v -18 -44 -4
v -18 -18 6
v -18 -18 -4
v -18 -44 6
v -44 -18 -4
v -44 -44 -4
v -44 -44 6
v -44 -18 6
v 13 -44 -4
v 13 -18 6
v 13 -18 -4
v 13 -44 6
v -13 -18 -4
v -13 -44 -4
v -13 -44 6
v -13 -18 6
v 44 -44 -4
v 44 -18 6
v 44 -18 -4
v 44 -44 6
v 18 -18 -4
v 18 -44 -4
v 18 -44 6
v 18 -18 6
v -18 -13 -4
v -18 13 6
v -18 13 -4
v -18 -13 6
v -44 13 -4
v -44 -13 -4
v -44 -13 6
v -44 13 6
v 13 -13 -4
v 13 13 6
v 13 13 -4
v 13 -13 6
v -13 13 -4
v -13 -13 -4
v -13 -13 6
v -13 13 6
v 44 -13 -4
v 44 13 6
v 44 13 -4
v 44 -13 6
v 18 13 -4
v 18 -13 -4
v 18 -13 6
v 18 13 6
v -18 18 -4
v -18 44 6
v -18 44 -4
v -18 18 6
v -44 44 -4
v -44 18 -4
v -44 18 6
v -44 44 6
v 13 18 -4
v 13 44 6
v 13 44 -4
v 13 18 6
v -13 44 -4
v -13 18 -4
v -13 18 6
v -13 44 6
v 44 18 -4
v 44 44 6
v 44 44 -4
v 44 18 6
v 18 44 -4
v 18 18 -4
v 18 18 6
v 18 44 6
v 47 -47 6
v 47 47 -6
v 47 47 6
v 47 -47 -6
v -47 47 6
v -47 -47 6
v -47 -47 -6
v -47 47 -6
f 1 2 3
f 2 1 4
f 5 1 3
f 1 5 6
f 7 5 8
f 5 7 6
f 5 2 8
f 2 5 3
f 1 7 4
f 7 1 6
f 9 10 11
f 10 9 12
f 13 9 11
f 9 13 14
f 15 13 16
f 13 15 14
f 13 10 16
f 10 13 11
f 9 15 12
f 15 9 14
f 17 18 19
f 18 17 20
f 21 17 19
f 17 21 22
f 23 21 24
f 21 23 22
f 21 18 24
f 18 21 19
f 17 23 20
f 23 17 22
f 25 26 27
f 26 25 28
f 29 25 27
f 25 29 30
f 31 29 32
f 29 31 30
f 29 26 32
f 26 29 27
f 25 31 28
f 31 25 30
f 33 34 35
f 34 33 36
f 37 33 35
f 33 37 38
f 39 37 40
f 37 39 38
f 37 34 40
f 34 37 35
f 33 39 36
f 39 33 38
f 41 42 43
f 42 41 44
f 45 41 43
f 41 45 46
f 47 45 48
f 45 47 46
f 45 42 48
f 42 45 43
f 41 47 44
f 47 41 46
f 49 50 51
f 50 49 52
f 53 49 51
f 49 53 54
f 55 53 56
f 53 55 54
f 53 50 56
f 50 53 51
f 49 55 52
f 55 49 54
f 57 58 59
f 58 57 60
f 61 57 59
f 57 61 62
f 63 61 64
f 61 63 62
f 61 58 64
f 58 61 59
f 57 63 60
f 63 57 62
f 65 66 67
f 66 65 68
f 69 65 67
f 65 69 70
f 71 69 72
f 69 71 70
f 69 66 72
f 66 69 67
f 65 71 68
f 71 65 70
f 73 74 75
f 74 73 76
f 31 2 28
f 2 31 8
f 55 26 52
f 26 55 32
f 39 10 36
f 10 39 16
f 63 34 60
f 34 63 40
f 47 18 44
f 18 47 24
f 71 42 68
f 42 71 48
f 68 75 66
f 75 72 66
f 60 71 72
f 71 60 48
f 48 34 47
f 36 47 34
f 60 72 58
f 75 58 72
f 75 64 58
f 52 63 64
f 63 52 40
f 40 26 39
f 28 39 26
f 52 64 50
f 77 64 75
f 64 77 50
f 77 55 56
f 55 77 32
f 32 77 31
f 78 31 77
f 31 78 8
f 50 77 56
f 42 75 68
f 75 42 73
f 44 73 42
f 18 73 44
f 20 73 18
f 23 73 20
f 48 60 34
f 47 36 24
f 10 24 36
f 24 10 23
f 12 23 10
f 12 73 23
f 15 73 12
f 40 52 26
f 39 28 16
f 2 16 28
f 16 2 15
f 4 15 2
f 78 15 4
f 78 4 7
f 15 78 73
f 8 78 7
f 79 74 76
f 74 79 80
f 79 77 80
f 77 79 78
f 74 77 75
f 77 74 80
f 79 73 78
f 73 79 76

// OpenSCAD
$fn = 32;

// ----------------------------------------------------------------------
// Pocket plate 94 x 94 x 12
// 3 x 3 pockets 26 mm square, 10 mm deep
// ----------------------------------------------------------------------

// --- parameters (mm) ---
thickness = 12;  // plate thickness
floor_t = 2;     // material left under each pocket
pocket = 26;     // pocket side length
pitch_x = 31;    // pocket pitch along X
pitch_y = 31;    // pocket pitch along Y
cols = 3;        // pockets per row
rows = 3;        // rows of pockets

// --- derived feature positions (mm) ---
depth = thickness - floor_t;        // = 10   pocket depth, down to the floor
span_x = (cols - 1) * pitch_x;      // = 62   distance between outer pockets
span_y = (rows - 1) * pitch_y;      // = 62   distance between outer pocket rows
origin_x = -span_x / 2;             // = -31   X of the first pocket
origin_y = -span_y / 2;             // = -31   Y of the first pocket
plate = [span_x + pocket + 6, span_y + pocket + 6, thickness];  // = [94, 94, 12]   overall size: pockets plus 3 mm of wall on each side
feature_centers = [
  [origin_x + 0 * pitch_x, origin_y + 0 * pitch_y],
  [origin_x + 1 * pitch_x, origin_y + 0 * pitch_y],
  [origin_x + 2 * pitch_x, origin_y + 0 * pitch_y],
  [origin_x + 0 * pitch_x, origin_y + 1 * pitch_y],
  [origin_x + 1 * pitch_x, origin_y + 1 * pitch_y],
  [origin_x + 2 * pitch_x, origin_y + 1 * pitch_y],
  [origin_x + 0 * pitch_x, origin_y + 2 * pitch_y],
  [origin_x + 1 * pitch_x, origin_y + 2 * pitch_y],
  [origin_x + 2 * pitch_x, origin_y + 2 * pitch_y]
];   // pocket centres, used verbatim by the cutter loop

// plate outline, then one pocket per centre in feature_centers
difference() {
  cube(plate, center = true);
  for (centre = feature_centers)
    translate([centre[0] - pocket / 2, centre[1] - pocket / 2, plate[2] / 2 - depth])
      cube([pocket, pocket, depth + 1]);  // centred on the declared pocket centre
}
